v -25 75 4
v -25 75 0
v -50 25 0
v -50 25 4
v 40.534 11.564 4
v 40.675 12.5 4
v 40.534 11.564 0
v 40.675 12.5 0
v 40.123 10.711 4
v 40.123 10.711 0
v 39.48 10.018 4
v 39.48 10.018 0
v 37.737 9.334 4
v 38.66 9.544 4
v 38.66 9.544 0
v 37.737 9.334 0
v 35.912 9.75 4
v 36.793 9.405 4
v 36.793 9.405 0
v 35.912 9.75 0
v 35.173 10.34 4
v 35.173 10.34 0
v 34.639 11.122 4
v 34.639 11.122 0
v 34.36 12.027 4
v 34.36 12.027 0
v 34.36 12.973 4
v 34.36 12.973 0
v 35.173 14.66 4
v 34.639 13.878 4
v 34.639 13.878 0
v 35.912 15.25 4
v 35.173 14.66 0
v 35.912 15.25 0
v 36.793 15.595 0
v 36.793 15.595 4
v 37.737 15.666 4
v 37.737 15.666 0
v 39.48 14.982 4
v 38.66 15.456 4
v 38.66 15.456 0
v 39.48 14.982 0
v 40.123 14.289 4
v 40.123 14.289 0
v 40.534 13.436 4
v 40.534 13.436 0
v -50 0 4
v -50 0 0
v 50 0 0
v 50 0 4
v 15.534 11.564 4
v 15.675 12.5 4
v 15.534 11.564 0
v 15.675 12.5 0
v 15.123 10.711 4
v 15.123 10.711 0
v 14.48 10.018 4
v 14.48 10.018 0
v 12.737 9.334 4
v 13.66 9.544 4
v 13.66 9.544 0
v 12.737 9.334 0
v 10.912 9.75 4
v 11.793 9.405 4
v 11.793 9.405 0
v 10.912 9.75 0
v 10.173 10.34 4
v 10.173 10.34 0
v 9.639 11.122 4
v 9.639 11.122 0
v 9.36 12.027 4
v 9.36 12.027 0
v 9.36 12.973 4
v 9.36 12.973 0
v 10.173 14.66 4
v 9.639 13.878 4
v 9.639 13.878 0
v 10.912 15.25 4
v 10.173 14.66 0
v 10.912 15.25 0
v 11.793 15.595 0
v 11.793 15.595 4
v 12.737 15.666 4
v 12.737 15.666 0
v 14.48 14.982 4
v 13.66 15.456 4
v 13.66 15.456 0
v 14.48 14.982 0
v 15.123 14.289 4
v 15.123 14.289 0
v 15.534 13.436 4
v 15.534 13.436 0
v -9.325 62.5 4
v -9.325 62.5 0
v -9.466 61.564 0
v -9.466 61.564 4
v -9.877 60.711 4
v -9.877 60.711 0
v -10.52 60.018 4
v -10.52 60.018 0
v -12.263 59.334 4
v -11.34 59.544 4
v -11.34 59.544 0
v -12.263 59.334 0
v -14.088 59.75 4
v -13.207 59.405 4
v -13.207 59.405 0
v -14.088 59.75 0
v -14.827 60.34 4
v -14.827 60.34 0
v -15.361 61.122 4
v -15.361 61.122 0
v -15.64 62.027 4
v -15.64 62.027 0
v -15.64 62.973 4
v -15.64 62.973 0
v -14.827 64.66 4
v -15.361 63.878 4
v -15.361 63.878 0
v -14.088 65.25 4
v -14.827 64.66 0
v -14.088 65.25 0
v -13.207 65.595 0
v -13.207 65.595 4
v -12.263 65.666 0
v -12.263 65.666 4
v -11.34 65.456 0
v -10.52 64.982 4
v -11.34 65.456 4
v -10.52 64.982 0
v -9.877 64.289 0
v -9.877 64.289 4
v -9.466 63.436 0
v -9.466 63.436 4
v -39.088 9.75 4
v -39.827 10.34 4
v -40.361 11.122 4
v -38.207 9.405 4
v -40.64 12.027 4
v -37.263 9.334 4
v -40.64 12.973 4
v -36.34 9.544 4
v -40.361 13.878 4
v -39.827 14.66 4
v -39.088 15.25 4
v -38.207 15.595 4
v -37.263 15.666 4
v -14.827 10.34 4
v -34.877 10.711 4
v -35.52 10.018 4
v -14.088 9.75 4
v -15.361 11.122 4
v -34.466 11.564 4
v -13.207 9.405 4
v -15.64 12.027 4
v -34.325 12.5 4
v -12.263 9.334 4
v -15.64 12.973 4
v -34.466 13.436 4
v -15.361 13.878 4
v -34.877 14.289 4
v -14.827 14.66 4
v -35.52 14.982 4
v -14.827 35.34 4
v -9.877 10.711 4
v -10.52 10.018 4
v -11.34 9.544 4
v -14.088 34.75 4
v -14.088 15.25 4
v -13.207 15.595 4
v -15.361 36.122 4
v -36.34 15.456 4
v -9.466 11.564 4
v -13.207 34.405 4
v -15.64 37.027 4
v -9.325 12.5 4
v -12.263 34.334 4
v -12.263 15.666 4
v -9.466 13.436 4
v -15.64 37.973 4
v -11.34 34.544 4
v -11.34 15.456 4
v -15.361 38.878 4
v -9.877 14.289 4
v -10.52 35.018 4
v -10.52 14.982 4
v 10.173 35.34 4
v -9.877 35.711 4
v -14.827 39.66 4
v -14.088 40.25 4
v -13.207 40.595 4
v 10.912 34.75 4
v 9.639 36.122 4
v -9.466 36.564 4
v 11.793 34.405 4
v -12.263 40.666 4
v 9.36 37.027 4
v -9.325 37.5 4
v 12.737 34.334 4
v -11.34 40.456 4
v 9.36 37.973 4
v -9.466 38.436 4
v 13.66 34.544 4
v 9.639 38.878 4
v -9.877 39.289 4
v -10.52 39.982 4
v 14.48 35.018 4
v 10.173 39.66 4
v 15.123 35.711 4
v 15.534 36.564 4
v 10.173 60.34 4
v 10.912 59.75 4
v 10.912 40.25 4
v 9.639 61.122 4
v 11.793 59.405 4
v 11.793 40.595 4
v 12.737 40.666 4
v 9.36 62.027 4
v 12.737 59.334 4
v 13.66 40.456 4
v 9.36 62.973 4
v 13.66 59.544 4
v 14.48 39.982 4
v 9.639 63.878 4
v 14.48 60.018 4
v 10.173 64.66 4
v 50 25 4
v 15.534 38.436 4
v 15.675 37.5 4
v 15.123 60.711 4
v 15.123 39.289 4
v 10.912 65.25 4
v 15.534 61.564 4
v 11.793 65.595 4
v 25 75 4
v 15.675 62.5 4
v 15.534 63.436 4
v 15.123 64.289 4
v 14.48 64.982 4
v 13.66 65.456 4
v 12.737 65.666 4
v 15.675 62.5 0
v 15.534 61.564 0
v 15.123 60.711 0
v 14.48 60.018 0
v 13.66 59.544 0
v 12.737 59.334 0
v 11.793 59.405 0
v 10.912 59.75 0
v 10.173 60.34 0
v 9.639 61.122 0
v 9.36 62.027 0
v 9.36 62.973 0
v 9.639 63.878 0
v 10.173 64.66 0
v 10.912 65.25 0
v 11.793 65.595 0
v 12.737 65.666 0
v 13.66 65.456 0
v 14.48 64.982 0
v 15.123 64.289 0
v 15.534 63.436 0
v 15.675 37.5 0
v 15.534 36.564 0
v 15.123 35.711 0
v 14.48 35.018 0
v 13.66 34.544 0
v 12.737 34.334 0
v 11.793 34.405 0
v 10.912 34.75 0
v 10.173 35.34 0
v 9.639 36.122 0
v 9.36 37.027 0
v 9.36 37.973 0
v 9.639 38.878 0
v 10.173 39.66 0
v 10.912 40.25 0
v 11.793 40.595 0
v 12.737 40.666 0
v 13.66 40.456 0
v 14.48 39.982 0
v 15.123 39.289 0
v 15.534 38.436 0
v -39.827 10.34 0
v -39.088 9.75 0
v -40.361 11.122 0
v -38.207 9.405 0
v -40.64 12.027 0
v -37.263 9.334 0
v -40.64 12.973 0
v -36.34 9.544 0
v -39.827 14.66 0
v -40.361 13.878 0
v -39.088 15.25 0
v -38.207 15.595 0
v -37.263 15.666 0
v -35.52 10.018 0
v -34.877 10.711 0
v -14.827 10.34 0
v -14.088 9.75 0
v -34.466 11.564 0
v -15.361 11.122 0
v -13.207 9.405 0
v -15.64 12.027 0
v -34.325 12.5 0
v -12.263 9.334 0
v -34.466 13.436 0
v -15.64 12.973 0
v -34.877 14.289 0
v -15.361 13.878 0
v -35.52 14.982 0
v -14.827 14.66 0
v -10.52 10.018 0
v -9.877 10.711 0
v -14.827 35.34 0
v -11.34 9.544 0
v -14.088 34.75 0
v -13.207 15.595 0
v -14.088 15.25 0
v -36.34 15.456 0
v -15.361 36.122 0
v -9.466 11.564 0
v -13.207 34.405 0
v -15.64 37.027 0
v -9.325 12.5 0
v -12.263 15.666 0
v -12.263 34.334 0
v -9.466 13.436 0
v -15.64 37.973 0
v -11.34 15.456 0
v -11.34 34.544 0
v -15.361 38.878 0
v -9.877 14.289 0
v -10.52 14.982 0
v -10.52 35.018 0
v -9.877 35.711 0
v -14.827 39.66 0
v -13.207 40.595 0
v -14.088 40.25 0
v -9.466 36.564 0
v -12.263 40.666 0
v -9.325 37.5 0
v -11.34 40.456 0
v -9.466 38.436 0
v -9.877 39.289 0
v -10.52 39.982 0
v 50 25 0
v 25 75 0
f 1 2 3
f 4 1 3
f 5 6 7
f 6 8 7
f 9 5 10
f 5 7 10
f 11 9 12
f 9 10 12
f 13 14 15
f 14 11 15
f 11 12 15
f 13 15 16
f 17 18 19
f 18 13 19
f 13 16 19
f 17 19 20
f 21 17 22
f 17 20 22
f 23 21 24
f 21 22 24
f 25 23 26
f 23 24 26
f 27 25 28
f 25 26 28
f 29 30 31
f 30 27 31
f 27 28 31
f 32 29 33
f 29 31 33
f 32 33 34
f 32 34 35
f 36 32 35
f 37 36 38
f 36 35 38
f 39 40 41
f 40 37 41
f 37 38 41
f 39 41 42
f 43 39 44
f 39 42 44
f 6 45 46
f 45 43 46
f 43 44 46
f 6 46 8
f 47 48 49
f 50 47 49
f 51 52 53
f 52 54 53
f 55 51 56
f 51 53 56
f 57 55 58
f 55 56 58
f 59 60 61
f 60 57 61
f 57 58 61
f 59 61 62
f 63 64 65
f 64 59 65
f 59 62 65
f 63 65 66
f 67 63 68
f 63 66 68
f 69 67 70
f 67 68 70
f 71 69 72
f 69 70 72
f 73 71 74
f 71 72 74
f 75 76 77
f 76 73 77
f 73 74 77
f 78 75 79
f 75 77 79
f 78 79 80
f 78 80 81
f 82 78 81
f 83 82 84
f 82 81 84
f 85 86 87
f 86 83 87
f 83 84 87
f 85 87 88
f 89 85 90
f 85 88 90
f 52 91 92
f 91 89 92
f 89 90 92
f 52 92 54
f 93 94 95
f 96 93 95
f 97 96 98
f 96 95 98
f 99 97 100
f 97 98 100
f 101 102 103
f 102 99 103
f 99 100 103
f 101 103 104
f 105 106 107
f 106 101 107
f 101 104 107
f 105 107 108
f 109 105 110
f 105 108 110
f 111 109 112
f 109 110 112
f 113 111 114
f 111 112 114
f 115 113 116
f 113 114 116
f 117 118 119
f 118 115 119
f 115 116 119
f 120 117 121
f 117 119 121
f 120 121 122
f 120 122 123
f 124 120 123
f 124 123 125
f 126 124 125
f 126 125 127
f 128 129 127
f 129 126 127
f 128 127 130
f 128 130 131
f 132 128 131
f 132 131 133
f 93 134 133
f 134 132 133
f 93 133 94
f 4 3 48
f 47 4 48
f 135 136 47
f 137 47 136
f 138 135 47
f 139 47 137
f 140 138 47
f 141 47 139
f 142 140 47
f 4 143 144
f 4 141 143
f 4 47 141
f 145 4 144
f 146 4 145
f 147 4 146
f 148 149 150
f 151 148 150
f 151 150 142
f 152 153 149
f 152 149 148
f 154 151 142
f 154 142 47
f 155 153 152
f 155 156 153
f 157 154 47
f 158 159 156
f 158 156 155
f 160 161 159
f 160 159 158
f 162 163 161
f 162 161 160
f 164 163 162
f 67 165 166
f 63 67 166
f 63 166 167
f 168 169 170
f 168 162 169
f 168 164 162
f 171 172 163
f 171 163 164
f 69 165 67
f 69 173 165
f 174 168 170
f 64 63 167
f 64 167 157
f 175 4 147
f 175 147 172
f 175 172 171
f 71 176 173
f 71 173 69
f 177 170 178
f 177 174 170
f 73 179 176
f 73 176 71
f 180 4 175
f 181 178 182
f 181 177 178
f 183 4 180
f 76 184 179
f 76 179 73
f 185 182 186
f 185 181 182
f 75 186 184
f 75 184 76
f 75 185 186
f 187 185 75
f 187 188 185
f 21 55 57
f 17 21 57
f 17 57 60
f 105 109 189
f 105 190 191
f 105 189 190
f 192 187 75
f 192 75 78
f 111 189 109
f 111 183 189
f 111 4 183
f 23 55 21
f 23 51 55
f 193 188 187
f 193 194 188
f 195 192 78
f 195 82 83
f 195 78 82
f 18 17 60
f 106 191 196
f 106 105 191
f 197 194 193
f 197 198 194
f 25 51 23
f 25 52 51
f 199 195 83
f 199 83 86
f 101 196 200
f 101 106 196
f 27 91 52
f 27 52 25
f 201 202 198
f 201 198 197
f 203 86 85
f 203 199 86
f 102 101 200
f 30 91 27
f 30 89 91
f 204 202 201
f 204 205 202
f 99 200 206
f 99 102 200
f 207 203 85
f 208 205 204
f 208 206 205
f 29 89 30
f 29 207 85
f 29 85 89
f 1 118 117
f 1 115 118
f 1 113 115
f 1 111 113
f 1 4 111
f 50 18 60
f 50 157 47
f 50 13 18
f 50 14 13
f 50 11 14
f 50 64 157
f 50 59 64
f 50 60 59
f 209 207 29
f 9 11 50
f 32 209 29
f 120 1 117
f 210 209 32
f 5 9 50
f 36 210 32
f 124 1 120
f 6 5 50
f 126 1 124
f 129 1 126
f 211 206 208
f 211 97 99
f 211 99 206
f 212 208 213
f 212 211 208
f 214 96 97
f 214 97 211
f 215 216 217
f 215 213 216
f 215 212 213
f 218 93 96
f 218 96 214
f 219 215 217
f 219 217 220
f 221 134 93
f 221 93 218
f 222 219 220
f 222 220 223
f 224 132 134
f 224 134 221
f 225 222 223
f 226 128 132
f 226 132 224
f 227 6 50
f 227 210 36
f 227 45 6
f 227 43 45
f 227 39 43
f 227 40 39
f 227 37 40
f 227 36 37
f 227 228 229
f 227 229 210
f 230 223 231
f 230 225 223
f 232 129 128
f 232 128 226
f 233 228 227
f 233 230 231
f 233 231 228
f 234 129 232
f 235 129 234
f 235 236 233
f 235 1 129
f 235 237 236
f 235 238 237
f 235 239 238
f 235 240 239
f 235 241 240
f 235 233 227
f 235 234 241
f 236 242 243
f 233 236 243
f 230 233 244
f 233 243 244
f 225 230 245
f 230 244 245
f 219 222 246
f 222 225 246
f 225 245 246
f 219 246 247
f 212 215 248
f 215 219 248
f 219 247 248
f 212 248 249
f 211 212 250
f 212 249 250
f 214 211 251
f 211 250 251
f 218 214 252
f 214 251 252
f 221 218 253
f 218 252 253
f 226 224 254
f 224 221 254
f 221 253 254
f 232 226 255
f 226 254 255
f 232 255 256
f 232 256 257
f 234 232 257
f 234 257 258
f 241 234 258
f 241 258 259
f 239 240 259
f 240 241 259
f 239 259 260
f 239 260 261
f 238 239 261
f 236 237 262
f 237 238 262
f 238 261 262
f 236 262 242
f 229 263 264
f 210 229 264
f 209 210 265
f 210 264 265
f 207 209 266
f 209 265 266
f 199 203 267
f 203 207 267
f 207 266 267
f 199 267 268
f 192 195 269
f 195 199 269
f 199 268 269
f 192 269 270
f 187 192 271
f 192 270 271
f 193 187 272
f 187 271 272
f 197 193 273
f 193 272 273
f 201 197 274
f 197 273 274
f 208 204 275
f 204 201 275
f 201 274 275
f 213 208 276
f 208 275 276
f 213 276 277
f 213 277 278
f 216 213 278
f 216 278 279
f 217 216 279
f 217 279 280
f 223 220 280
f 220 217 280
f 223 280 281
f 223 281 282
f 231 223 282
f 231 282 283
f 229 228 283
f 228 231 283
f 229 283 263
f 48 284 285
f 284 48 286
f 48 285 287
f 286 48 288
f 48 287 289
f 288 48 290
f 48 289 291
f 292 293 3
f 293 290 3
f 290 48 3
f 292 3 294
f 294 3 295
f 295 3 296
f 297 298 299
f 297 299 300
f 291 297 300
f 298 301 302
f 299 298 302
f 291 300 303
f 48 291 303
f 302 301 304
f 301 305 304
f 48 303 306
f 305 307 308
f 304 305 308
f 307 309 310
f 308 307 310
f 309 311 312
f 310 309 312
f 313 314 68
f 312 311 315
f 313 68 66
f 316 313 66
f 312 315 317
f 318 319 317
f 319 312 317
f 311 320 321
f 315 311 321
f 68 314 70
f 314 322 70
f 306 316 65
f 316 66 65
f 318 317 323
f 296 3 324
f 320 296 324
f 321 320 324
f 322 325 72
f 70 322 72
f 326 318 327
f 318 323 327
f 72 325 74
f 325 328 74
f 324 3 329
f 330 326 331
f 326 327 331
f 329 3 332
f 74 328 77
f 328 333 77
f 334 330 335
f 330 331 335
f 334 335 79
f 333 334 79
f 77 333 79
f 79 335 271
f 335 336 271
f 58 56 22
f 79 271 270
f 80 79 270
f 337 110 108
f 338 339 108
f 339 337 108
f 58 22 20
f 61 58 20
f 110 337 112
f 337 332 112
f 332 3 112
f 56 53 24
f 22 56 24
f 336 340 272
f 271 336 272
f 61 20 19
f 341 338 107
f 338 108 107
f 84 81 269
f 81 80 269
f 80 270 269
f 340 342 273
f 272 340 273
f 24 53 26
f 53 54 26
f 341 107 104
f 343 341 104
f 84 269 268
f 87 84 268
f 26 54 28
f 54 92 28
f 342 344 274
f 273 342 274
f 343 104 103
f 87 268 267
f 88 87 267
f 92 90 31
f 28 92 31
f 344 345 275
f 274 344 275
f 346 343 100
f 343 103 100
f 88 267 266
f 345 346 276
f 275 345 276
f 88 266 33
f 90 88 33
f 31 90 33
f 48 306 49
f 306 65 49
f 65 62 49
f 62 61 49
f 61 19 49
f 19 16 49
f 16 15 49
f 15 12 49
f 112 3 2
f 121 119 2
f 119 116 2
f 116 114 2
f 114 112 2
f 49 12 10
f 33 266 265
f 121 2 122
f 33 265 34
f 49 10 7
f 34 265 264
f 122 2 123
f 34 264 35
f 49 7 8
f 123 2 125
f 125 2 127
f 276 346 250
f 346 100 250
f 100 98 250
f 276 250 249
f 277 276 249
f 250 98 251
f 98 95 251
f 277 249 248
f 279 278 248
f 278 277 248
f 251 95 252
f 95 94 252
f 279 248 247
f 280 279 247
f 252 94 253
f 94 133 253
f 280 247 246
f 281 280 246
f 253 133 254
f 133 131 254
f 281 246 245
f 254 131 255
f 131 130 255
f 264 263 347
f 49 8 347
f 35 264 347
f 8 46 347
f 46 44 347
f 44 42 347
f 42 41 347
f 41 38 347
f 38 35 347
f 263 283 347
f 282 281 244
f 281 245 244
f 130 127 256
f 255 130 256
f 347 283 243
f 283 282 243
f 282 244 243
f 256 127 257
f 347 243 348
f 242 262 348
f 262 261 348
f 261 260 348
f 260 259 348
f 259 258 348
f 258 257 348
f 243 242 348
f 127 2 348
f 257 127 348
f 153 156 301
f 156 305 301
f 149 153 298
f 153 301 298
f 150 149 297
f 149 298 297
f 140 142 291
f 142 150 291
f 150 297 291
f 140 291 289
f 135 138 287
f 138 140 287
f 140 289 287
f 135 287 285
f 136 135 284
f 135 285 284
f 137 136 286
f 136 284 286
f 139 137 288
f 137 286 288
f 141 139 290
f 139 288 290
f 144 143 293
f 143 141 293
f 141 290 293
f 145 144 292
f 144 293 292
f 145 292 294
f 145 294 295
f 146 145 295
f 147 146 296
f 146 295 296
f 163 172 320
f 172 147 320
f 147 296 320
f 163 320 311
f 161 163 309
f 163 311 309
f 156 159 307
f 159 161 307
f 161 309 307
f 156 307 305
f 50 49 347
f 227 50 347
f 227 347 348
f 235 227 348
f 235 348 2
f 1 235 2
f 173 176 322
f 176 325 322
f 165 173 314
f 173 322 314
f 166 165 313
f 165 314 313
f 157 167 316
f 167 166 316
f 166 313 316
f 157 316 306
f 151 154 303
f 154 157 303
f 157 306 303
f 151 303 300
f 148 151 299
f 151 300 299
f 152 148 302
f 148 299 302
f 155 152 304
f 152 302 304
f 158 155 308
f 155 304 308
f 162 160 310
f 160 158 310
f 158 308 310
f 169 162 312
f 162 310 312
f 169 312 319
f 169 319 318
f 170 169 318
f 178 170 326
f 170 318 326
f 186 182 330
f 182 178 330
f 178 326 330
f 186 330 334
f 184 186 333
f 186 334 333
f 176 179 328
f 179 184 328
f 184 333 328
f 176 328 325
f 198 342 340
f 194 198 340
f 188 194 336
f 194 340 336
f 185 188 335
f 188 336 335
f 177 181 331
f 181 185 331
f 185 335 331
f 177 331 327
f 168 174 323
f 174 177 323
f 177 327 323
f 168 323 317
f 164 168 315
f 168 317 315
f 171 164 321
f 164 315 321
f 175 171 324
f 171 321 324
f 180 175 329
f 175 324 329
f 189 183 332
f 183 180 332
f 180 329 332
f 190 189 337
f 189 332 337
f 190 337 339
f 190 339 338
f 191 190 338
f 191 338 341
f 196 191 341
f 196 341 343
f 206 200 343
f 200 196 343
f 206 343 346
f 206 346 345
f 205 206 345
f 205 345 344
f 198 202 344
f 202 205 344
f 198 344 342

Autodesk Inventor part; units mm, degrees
ref_plane "YZ Plane" through (0, 0, 0) normal (1, 0, 0) x (0, 1, 0)
ref_plane "XZ Plane" through (0, 0, 0) normal (0, 1, 0) x (-1, 0, 0)
ref_plane "XY Plane" through (0, 0, 0) normal (0, 0, 1) x (1, 0, 0)
sketch "Sketch_1" plane through (0, 0, 0) normal (0, 0, 1) x (1, 0, 0)
  line L0 (-50, 25) -> (-50, 0)
  line L1 (-50, 0) -> (50, 0)
  line L2 (50, 0) -> (50, 25)
  line L3 (50, 25) -> (25, 75)
  line L4 (25, 75) -> (-25, 75)
  line L5 (-25, 75) -> (-50, 25)
  circle A0 centre (37.5, 12.5) radius 3.175
  circle A1 centre (12.5, 12.5) radius 3.175
  circle A2 centre (12.5, 37.5) radius 3.175
  circle A3 centre (12.5, 62.5) radius 3.175
  circle A4 centre (-12.5, 37.5) radius 3.175
  circle A5 centre (-12.5, 12.5) radius 3.175
  circle A6 centre (-12.5, 62.5) radius 3.175
  circle A7 centre (-37.5, 12.5) radius 3.175
extrude "Extrusion1" add sketch "Sketch_1" along normal blind 4
properties part number "25-4155"
